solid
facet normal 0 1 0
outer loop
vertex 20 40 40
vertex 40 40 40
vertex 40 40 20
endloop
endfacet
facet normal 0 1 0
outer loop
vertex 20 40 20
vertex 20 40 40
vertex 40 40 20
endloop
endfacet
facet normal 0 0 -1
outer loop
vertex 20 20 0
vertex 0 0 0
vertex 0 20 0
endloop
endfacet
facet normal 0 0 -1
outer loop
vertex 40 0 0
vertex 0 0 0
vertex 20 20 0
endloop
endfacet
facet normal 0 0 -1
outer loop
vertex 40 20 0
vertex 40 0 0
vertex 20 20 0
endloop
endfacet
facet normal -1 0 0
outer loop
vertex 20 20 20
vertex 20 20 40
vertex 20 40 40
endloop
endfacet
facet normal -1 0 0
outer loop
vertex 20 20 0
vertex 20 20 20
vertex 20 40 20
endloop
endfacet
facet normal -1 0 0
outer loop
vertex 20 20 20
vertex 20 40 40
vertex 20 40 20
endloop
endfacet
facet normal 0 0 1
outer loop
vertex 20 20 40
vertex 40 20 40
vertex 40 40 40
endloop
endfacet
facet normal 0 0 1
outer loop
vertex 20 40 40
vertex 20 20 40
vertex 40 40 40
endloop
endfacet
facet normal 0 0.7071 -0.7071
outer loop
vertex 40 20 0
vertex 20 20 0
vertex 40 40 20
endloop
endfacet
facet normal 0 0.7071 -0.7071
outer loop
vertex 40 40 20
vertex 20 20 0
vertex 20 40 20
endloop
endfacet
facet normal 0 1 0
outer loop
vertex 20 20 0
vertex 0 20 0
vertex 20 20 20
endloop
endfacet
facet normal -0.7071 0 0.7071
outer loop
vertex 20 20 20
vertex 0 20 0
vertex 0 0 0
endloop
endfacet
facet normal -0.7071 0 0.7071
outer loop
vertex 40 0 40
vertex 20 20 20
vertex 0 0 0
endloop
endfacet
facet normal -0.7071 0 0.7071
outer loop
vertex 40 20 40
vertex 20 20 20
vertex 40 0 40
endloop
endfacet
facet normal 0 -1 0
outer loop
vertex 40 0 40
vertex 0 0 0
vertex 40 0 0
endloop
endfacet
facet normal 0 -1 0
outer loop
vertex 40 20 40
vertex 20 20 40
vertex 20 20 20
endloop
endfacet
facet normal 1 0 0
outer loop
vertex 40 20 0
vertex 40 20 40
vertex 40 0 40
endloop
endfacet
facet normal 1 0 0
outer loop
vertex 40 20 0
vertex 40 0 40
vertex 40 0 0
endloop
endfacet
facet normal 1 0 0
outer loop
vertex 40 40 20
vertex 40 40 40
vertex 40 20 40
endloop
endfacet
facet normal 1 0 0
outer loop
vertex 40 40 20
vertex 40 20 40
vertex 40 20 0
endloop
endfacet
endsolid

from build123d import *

# Parameters (mm, degrees)
SKETCH1_W           = 40
SKETCH1_H           = 20
BOSS_EXTRUDE1_DEPTH = 40
CUT_EXTRUDE1_DEPTH  = 40
SKETCH3_W           = 40
SKETCH3_H           = 20
BOSS_EXTRUDE2_DEPTH = 20
CUT_EXTRUDE2_DEPTH  = 20


with BuildPart() as part:
    # Sketch1 → Boss-Extrude1 (new body)
    with BuildSketch(Plane.XY):
        with Locations((20, 10)):
            Rectangle(SKETCH1_W, SKETCH1_H)
    extrude(amount=BOSS_EXTRUDE1_DEPTH)

    # Sketch2 → Cut-Extrude1 (cut)
    with BuildSketch(Plane(origin=(0, 20, 0), x_dir=(1, 0, 0), z_dir=(0, 1, 0))):
        Polygon((0, 0), (40, -40), (0, -40), align=None)
    extrude(amount=-CUT_EXTRUDE1_DEPTH, mode=Mode.SUBTRACT)

    # Sketch3 → Boss-Extrude2 (add)
    with BuildSketch(Plane(origin=(40, 0, 0), x_dir=(0, 0, -1), z_dir=(1, 0, 0))):
        with Locations((-20, 30)):
            Rectangle(SKETCH3_W, SKETCH3_H)
    extrude(amount=-BOSS_EXTRUDE2_DEPTH)

    # Sketch4 → Cut-Extrude2 (cut)
    with BuildSketch(Plane.ZY.offset(-20)):
        Polygon((0, 20), (20, 40), (0, 40), align=None)
    extrude(amount=-CUT_EXTRUDE2_DEPTH, mode=Mode.SUBTRACT)


solid = part.part
